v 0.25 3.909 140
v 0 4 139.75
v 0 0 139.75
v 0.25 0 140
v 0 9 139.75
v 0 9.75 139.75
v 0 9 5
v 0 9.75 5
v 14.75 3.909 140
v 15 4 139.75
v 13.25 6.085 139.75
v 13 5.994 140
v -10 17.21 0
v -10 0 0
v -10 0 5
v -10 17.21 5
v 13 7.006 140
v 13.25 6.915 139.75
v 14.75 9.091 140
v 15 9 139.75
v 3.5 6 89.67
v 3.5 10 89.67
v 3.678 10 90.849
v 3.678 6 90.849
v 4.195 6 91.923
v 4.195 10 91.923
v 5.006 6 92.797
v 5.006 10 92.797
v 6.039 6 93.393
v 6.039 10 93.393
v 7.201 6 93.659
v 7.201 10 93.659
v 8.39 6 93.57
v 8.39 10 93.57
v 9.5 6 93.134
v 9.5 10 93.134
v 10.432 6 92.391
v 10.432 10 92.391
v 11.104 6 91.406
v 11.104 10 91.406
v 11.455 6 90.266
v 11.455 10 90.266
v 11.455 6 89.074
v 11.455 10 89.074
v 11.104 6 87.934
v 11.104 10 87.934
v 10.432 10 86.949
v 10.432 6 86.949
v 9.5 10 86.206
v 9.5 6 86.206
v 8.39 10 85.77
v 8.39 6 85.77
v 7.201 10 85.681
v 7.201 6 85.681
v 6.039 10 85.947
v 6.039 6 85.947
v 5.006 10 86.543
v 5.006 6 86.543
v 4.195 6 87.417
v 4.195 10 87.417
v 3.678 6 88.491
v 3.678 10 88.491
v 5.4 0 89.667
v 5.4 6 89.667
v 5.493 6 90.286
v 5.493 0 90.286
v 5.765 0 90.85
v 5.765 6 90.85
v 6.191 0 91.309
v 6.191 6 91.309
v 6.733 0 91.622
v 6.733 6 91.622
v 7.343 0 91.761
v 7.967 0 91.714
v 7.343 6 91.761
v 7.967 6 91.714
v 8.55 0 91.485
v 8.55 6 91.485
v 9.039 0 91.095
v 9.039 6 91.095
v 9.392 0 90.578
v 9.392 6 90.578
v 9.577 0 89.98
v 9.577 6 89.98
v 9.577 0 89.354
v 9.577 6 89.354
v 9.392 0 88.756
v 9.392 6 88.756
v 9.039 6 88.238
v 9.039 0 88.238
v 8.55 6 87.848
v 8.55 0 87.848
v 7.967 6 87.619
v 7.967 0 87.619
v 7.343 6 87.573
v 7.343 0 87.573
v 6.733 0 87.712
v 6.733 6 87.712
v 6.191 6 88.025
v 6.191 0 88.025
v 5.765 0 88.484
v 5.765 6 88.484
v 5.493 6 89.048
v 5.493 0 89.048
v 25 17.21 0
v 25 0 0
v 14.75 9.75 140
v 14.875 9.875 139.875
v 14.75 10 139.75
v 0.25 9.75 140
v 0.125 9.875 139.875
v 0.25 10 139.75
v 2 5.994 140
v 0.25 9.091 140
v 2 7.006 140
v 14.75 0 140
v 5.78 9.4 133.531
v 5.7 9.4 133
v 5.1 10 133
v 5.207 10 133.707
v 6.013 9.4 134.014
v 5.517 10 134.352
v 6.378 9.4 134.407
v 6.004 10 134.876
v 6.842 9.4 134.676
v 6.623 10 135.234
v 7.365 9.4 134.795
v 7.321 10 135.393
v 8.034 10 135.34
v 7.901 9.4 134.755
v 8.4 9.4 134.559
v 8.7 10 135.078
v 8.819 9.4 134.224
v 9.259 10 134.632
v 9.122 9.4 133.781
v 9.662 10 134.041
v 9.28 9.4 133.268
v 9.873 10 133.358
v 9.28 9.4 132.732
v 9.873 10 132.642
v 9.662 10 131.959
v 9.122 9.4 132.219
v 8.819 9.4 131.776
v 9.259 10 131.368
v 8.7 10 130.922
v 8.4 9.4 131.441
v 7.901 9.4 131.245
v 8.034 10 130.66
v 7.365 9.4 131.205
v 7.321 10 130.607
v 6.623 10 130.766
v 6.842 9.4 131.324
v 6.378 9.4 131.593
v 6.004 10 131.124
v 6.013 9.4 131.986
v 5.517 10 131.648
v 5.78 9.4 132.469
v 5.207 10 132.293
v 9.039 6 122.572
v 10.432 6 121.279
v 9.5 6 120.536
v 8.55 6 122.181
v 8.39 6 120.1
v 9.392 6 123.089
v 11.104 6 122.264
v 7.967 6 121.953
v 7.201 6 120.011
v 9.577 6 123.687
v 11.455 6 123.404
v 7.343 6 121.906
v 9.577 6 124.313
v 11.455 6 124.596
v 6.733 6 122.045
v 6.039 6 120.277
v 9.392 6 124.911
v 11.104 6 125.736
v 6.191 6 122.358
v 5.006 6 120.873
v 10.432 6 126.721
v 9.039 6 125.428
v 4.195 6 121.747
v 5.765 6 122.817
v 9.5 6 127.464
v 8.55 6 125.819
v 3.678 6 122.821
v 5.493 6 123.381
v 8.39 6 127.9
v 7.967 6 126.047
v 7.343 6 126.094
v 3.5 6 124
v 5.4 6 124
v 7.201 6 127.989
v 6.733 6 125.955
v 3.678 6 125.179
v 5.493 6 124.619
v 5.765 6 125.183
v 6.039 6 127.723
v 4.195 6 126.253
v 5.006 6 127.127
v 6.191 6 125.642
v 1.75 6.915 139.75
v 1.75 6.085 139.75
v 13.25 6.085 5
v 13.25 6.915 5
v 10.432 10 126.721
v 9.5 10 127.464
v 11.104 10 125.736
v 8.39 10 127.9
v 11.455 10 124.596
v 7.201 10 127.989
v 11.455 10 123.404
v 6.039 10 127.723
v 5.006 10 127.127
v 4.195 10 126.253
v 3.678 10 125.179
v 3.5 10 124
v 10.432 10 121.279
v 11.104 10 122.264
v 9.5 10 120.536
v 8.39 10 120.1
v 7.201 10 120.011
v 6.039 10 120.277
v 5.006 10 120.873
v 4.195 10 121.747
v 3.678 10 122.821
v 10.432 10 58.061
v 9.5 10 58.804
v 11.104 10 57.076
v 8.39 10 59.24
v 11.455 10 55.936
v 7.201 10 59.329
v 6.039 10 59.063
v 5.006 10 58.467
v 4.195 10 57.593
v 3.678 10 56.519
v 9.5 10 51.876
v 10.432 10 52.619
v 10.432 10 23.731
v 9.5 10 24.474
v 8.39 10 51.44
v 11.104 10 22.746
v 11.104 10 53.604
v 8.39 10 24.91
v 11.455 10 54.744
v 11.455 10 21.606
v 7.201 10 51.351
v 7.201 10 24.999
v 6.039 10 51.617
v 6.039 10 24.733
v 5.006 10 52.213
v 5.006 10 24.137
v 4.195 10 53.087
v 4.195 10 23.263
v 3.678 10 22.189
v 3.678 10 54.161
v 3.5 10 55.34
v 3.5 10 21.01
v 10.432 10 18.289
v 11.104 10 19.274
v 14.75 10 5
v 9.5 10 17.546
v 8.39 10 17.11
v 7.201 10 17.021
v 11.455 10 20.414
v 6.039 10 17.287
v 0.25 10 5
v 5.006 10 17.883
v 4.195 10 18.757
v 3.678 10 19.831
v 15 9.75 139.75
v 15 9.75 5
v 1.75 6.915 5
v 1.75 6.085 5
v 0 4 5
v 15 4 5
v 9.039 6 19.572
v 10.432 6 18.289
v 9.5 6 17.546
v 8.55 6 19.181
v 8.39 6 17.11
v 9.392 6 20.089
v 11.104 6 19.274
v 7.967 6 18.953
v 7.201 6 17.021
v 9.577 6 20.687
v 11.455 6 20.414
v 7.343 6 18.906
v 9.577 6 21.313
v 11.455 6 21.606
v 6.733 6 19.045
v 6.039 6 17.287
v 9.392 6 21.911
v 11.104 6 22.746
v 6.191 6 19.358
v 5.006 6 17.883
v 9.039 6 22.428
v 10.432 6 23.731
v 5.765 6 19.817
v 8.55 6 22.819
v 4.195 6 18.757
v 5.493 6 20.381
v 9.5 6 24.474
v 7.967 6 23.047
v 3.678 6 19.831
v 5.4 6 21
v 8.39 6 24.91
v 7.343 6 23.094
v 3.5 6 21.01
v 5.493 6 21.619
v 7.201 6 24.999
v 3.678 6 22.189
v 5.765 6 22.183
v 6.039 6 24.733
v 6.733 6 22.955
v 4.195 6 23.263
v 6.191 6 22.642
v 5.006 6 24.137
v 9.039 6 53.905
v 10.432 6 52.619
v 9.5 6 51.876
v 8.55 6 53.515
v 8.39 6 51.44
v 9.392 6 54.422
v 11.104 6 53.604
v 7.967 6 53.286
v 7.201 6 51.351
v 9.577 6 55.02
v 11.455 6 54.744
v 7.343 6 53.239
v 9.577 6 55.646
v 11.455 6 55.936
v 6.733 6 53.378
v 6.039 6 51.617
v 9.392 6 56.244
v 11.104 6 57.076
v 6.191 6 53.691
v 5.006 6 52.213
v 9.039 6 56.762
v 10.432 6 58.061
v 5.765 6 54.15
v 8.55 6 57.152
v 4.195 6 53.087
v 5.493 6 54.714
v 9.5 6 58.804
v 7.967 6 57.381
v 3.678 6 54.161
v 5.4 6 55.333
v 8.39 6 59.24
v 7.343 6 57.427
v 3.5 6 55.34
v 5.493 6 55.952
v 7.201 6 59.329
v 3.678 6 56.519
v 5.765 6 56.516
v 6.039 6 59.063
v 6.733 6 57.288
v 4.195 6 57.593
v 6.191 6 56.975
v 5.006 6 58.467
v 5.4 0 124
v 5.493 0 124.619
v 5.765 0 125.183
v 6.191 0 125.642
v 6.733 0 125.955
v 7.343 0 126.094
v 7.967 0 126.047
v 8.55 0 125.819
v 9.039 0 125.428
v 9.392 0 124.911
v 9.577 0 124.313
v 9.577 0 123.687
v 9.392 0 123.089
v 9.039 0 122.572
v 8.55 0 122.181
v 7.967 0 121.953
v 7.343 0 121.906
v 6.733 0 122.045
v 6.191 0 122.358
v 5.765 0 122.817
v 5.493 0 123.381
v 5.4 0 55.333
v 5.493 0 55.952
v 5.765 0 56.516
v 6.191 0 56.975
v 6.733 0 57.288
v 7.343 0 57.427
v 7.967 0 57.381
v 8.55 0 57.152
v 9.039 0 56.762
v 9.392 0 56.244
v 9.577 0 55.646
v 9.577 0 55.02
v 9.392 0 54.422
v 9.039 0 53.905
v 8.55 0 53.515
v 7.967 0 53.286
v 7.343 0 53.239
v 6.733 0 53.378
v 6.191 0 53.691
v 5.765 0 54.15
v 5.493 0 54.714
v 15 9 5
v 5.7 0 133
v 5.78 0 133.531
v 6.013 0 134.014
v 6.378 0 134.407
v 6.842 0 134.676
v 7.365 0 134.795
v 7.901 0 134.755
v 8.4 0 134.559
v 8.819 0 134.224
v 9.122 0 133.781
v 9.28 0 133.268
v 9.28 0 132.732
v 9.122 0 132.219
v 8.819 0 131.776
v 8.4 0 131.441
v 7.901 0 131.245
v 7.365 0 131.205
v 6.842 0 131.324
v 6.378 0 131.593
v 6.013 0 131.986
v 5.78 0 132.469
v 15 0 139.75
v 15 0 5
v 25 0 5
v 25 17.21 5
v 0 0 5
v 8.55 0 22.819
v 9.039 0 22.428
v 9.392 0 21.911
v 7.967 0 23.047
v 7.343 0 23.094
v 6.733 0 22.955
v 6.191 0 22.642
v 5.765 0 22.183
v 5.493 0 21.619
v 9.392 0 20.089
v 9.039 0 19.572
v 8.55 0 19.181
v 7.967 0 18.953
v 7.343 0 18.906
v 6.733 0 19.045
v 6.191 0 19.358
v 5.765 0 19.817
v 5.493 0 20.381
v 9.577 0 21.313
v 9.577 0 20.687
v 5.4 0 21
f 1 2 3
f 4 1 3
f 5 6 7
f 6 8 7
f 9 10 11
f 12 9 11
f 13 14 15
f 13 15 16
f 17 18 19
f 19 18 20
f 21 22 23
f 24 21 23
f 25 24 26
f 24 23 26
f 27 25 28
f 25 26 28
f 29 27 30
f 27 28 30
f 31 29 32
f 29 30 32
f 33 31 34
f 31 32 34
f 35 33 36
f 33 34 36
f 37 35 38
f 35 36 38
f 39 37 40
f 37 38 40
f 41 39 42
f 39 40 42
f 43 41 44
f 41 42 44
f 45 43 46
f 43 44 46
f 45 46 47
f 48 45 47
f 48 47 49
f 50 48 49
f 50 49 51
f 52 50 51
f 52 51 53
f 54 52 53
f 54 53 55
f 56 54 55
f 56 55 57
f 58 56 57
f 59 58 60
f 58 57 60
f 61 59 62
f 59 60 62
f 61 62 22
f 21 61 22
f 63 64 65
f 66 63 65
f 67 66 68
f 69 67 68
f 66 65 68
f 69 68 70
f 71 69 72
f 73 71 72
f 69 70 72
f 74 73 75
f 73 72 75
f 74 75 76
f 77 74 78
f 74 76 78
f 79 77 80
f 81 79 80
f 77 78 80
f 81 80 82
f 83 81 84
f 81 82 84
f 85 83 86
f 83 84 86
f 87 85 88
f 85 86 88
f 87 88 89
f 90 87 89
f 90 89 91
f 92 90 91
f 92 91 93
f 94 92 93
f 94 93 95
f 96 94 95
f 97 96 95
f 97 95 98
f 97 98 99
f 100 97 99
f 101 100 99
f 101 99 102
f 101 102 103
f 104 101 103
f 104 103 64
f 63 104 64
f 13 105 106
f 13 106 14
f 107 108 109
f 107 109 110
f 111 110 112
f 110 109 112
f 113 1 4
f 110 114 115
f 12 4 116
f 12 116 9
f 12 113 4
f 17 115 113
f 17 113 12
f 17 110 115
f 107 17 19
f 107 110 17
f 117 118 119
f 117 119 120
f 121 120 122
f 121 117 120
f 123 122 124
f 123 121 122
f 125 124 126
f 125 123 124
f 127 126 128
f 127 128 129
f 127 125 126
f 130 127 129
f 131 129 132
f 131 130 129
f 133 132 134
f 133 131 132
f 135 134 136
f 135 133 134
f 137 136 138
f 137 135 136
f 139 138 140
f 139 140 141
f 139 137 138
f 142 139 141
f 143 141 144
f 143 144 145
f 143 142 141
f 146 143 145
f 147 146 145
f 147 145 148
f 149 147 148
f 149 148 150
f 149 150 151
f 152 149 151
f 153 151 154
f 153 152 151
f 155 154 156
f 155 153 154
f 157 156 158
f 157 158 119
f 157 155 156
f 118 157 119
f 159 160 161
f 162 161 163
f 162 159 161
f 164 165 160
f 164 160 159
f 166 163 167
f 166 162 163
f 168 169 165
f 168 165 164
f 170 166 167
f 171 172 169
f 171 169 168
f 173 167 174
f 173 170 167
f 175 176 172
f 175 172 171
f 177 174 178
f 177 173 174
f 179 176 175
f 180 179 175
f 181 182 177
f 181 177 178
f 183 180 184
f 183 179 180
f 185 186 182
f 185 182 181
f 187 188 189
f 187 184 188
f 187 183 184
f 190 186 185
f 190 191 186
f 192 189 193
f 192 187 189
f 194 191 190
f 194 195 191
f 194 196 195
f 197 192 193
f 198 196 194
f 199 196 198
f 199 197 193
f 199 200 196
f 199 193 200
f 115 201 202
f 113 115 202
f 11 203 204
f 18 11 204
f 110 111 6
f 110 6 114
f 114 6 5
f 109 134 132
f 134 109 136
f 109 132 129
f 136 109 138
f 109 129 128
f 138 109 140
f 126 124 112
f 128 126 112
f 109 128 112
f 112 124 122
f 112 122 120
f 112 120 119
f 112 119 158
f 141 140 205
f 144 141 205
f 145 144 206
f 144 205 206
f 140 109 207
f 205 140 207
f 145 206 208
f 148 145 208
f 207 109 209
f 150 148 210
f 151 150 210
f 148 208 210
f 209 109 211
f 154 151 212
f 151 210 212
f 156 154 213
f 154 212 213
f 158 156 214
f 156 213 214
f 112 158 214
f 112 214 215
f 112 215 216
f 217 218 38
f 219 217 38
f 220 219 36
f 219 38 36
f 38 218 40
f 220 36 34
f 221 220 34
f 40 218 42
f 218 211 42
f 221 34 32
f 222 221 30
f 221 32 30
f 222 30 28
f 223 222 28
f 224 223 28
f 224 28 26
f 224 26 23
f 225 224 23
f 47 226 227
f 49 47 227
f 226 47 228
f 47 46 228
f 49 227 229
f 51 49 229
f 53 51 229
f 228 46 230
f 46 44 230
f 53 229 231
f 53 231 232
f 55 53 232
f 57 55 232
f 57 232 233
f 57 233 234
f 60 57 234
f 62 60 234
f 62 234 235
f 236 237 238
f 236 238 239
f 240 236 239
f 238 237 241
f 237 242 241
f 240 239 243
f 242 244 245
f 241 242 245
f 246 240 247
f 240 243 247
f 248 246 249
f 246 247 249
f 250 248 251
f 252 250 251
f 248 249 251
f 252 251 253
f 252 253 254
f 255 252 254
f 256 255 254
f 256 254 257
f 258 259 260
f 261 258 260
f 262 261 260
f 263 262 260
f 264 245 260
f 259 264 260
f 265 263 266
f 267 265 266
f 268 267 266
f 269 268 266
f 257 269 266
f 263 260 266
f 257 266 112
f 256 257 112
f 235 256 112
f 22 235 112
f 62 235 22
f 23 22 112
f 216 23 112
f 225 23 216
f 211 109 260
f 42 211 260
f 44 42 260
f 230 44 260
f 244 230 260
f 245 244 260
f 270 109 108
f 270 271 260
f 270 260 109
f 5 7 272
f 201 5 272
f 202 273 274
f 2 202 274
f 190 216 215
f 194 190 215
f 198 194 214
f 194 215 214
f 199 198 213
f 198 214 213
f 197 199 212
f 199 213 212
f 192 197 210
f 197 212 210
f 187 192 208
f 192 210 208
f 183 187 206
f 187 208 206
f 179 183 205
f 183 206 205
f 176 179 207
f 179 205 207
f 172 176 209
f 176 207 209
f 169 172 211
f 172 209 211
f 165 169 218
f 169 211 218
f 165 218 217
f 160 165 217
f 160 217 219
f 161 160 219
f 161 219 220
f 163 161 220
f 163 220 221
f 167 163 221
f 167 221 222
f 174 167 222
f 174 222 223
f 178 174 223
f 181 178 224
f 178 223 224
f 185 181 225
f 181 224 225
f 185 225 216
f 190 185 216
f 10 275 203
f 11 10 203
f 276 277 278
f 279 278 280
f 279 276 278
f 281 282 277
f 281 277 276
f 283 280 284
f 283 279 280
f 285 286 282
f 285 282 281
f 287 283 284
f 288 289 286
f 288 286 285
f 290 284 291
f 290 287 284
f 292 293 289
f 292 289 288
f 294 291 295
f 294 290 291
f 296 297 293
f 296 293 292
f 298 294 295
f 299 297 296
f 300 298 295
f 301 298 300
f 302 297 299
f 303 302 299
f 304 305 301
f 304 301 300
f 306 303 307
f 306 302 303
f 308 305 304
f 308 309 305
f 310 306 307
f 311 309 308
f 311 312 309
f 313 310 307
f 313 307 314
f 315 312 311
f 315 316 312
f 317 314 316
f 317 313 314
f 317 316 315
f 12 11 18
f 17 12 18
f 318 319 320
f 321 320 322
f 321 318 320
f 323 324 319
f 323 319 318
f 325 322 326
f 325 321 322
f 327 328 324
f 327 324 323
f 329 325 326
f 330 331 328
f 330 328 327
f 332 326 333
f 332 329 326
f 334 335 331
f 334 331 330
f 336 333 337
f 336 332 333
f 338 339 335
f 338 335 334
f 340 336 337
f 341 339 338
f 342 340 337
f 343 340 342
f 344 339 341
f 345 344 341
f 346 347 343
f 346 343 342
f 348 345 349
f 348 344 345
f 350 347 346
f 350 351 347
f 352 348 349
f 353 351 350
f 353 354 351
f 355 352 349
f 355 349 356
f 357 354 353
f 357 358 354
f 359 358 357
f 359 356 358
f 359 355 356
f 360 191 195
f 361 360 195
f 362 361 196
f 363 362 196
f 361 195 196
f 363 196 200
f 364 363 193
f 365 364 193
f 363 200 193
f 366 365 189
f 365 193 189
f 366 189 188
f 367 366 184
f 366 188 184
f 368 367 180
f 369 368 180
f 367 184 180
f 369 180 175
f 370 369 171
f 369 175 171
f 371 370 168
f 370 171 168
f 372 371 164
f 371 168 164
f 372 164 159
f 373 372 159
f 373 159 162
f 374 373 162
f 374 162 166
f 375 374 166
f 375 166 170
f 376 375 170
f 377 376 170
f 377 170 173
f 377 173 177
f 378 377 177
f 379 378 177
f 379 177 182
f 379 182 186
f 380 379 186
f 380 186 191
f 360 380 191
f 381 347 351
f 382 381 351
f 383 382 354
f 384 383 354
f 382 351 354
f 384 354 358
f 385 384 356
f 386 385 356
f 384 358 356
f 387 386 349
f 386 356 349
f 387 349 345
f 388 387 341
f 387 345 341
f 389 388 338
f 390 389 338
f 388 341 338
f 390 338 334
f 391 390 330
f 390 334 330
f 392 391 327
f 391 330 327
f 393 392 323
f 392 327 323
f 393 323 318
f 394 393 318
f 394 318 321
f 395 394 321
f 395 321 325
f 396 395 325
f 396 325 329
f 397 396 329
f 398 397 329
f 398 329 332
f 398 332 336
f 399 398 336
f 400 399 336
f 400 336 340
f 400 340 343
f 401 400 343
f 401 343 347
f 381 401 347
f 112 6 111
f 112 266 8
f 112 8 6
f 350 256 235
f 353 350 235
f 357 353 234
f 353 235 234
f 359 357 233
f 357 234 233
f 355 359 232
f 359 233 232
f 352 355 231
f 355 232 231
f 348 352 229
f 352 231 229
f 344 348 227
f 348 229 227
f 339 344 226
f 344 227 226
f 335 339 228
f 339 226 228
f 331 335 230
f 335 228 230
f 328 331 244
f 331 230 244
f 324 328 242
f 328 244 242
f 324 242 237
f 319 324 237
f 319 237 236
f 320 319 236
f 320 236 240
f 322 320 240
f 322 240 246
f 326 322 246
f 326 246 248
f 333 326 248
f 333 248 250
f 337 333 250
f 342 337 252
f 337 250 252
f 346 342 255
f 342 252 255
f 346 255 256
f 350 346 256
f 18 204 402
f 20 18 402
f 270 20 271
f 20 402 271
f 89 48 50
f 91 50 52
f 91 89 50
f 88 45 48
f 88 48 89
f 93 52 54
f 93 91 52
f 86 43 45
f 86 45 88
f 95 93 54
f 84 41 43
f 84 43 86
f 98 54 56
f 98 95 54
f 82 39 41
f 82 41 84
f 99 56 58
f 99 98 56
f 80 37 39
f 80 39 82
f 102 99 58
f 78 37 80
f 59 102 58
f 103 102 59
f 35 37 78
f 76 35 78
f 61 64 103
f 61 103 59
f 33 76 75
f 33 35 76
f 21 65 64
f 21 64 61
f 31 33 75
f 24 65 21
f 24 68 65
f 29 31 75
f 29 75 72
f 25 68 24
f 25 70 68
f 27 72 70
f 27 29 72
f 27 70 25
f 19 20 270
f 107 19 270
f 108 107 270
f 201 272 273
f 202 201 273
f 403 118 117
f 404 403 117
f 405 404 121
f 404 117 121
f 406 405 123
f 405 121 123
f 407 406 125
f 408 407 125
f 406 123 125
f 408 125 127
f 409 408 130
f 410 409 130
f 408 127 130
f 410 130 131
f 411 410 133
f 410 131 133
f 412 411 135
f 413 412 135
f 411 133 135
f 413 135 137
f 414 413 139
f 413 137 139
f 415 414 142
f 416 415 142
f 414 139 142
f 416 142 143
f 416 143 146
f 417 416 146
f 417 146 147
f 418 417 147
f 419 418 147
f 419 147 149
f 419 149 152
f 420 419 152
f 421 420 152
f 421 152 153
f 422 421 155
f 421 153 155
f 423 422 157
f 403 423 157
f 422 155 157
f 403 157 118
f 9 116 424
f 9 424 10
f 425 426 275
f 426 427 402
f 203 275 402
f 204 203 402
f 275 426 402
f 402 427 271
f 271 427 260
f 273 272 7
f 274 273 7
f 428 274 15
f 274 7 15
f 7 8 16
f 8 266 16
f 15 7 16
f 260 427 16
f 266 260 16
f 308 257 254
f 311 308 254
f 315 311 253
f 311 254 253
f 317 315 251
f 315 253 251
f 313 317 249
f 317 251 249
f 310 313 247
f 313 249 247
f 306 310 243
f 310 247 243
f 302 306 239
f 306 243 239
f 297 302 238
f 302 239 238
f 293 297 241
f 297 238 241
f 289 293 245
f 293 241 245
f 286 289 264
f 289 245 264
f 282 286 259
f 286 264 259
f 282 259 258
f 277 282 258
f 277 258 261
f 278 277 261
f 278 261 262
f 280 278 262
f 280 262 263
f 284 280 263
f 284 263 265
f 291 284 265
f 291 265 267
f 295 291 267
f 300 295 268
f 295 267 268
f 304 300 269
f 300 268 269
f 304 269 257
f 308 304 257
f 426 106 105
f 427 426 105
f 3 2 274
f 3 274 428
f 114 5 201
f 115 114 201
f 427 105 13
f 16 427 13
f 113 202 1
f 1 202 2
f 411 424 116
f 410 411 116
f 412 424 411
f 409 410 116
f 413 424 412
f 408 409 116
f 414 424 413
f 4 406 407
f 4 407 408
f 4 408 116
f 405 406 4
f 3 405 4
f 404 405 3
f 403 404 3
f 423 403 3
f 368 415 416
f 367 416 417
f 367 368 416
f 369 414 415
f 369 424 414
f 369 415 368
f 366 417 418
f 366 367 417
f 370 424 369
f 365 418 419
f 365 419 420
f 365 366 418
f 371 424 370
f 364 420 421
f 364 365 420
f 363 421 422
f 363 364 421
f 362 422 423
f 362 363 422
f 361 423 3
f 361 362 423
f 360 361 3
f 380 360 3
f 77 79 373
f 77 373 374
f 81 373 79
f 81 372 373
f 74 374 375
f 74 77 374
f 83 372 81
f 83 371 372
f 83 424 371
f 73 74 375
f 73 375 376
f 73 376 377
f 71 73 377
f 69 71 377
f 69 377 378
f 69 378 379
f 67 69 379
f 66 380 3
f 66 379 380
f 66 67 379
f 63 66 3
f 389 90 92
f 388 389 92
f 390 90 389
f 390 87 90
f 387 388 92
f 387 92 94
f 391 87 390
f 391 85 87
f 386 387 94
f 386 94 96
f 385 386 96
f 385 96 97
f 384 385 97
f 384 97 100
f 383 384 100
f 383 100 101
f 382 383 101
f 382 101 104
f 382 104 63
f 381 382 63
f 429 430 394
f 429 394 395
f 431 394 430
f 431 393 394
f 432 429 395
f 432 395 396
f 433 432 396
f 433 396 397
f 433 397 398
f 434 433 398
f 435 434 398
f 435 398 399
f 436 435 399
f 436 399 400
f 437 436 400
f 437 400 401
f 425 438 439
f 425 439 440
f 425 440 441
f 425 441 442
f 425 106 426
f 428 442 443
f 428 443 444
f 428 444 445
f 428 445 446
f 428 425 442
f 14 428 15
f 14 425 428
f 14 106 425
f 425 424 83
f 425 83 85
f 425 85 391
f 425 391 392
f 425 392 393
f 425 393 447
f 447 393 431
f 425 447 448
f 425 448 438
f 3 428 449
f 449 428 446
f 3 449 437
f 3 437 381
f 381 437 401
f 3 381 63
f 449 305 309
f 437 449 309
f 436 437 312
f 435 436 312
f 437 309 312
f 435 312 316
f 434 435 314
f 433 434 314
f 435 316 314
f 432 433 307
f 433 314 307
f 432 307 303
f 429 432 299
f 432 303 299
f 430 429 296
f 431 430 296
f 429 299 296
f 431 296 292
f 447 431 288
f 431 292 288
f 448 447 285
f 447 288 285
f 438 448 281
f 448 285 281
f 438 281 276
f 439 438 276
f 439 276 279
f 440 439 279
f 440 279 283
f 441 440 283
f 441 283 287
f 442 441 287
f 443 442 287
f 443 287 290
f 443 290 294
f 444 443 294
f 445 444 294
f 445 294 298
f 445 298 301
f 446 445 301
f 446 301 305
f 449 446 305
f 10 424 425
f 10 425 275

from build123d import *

# Parameters (mm, degrees)
P_IDAT_VYSUNUT_M1_DEPTH  = 140
SKICA2_W                 = 35
SKICA2_H                 = 17.21
P_IDAT_VYSUNUT_M2_DEPTH  = 5
SKICA3_R                 = 2.1
ODEBRAT_VYSUNUT_M1_DEPTH = 10
SKICA4_R                 = 4
ODEBRAT_VYSUNUT_M2_DEPTH = 4
SKICA5_R                 = 1.8
ODEBRAT_VYSUNUT_M3_DEPTH = 10
ZKOSEN_2_SIZE            = 0.25
ZKOSEN_3_SIZE            = 0.25
ZKOSEN_4_SIZE            = 0.6


with BuildPart() as part:
    # Skica1 → Přidat vysunutím1 (new body)
    with BuildSketch(Plane.XY):
        Polygon((0, 9), (1.749522731, 6.915), (1.749522731, 6.085), (0, 4), (0, 0), (15, 0), (15, 4), (13.250477269, 6.085), (13.250477269, 6.915), (15, 9), (15, 10), (0, 10), align=None)
    extrude(amount=P_IDAT_VYSUNUT_M1_DEPTH)

    # Skica2 → Přidat vysunutím2 (add)
    with BuildSketch(Plane(origin=(0, 0, 0), x_dir=(-1, 0, 0), z_dir=(0, 0, -1))):
        with Locations((-7.5, 8.605)):
            Rectangle(SKICA2_W, SKICA2_H)
    extrude(amount=-P_IDAT_VYSUNUT_M2_DEPTH)

    # Skica3 → Odebrat vysunutím1 (cut)
    with BuildSketch(Plane(origin=(0, 10, 0), x_dir=(1, 0, 0), z_dir=(0, 1, 0))):
        with Locations(Location((7.5, -124, 0), (0, 0, 180))):
            Circle(SKICA3_R)
        with Locations(Location((7.5, -89.666666667, 0), (0, 0, 180))):
            Circle(SKICA3_R)
        with Locations(Location((7.5, -55.333333333, 0), (0, 0, 180))):
            Circle(SKICA3_R)
        with Locations(Location((7.5, -21, 0), (0, 0, 180))):
            Circle(SKICA3_R)
    extrude(amount=-ODEBRAT_VYSUNUT_M1_DEPTH, mode=Mode.SUBTRACT)

    # Skica4 → Odebrat vysunutím2 (cut)
    with BuildSketch(Plane(origin=(0, 10, 0), x_dir=(1, 0, 0), z_dir=(0, 1, 0))):
        with Locations(Location((7.5, -124, 0), (0, 0, 180))):
            Circle(SKICA4_R)
        with Locations(Location((7.5, -89.67, 0), (0, 0, 180))):
            Circle(SKICA4_R)
        with Locations(Location((7.5, -55.34, 0), (0, 0, 180))):
            Circle(SKICA4_R)
        with Locations(Location((7.5, -21.01, 0), (0, 0, 180))):
            Circle(SKICA4_R)
    extrude(amount=-ODEBRAT_VYSUNUT_M2_DEPTH, mode=Mode.SUBTRACT)

    # Skica5 → Odebrat vysunutím3 (cut)
    with BuildSketch(Plane(origin=(0, 10, 0), x_dir=(1, 0, 0), z_dir=(0, 1, 0))):
        with Locations(Location((7.5, -133, 0), (0, 0, 180))):
            Circle(SKICA5_R)
    extrude(amount=-ODEBRAT_VYSUNUT_M3_DEPTH, mode=Mode.SUBTRACT)

    # Zkosení2
    zkosen_2_edges = [part.edges().sort_by_distance(p)[0] for p in [
        (15, 2, 140),
        (14.125238634, 5.0425, 140),
        (13.250477269, 6.5, 140),
        (14.125238634, 7.9575, 140),
        (15, 9.5, 140),
        (7.5, 10, 140),
        (0, 9.5, 140),
        (0.874761366, 7.9575, 140),
        (1.749522731, 6.5, 140),
        (0.874761366, 5.0425, 140),
        (0, 2, 140),
    ]]
    chamfer(zkosen_2_edges, length=ZKOSEN_2_SIZE)

    # Zkosení3
    zkosen_3_edges = [part.edges().sort_by_distance(p)[0] for p in [
        (15, 10, 72.375),
        (0, 10, 72.375),
    ]]
    chamfer(zkosen_3_edges, length=ZKOSEN_3_SIZE)

    # Zkosení4
    zkosen_4_edges = [part.edges().sort_by_distance(p)[0] for p in [
        (9.3, 10, 133),
    ]]
    chamfer(zkosen_4_edges, length=ZKOSEN_4_SIZE)


solid = part.part
